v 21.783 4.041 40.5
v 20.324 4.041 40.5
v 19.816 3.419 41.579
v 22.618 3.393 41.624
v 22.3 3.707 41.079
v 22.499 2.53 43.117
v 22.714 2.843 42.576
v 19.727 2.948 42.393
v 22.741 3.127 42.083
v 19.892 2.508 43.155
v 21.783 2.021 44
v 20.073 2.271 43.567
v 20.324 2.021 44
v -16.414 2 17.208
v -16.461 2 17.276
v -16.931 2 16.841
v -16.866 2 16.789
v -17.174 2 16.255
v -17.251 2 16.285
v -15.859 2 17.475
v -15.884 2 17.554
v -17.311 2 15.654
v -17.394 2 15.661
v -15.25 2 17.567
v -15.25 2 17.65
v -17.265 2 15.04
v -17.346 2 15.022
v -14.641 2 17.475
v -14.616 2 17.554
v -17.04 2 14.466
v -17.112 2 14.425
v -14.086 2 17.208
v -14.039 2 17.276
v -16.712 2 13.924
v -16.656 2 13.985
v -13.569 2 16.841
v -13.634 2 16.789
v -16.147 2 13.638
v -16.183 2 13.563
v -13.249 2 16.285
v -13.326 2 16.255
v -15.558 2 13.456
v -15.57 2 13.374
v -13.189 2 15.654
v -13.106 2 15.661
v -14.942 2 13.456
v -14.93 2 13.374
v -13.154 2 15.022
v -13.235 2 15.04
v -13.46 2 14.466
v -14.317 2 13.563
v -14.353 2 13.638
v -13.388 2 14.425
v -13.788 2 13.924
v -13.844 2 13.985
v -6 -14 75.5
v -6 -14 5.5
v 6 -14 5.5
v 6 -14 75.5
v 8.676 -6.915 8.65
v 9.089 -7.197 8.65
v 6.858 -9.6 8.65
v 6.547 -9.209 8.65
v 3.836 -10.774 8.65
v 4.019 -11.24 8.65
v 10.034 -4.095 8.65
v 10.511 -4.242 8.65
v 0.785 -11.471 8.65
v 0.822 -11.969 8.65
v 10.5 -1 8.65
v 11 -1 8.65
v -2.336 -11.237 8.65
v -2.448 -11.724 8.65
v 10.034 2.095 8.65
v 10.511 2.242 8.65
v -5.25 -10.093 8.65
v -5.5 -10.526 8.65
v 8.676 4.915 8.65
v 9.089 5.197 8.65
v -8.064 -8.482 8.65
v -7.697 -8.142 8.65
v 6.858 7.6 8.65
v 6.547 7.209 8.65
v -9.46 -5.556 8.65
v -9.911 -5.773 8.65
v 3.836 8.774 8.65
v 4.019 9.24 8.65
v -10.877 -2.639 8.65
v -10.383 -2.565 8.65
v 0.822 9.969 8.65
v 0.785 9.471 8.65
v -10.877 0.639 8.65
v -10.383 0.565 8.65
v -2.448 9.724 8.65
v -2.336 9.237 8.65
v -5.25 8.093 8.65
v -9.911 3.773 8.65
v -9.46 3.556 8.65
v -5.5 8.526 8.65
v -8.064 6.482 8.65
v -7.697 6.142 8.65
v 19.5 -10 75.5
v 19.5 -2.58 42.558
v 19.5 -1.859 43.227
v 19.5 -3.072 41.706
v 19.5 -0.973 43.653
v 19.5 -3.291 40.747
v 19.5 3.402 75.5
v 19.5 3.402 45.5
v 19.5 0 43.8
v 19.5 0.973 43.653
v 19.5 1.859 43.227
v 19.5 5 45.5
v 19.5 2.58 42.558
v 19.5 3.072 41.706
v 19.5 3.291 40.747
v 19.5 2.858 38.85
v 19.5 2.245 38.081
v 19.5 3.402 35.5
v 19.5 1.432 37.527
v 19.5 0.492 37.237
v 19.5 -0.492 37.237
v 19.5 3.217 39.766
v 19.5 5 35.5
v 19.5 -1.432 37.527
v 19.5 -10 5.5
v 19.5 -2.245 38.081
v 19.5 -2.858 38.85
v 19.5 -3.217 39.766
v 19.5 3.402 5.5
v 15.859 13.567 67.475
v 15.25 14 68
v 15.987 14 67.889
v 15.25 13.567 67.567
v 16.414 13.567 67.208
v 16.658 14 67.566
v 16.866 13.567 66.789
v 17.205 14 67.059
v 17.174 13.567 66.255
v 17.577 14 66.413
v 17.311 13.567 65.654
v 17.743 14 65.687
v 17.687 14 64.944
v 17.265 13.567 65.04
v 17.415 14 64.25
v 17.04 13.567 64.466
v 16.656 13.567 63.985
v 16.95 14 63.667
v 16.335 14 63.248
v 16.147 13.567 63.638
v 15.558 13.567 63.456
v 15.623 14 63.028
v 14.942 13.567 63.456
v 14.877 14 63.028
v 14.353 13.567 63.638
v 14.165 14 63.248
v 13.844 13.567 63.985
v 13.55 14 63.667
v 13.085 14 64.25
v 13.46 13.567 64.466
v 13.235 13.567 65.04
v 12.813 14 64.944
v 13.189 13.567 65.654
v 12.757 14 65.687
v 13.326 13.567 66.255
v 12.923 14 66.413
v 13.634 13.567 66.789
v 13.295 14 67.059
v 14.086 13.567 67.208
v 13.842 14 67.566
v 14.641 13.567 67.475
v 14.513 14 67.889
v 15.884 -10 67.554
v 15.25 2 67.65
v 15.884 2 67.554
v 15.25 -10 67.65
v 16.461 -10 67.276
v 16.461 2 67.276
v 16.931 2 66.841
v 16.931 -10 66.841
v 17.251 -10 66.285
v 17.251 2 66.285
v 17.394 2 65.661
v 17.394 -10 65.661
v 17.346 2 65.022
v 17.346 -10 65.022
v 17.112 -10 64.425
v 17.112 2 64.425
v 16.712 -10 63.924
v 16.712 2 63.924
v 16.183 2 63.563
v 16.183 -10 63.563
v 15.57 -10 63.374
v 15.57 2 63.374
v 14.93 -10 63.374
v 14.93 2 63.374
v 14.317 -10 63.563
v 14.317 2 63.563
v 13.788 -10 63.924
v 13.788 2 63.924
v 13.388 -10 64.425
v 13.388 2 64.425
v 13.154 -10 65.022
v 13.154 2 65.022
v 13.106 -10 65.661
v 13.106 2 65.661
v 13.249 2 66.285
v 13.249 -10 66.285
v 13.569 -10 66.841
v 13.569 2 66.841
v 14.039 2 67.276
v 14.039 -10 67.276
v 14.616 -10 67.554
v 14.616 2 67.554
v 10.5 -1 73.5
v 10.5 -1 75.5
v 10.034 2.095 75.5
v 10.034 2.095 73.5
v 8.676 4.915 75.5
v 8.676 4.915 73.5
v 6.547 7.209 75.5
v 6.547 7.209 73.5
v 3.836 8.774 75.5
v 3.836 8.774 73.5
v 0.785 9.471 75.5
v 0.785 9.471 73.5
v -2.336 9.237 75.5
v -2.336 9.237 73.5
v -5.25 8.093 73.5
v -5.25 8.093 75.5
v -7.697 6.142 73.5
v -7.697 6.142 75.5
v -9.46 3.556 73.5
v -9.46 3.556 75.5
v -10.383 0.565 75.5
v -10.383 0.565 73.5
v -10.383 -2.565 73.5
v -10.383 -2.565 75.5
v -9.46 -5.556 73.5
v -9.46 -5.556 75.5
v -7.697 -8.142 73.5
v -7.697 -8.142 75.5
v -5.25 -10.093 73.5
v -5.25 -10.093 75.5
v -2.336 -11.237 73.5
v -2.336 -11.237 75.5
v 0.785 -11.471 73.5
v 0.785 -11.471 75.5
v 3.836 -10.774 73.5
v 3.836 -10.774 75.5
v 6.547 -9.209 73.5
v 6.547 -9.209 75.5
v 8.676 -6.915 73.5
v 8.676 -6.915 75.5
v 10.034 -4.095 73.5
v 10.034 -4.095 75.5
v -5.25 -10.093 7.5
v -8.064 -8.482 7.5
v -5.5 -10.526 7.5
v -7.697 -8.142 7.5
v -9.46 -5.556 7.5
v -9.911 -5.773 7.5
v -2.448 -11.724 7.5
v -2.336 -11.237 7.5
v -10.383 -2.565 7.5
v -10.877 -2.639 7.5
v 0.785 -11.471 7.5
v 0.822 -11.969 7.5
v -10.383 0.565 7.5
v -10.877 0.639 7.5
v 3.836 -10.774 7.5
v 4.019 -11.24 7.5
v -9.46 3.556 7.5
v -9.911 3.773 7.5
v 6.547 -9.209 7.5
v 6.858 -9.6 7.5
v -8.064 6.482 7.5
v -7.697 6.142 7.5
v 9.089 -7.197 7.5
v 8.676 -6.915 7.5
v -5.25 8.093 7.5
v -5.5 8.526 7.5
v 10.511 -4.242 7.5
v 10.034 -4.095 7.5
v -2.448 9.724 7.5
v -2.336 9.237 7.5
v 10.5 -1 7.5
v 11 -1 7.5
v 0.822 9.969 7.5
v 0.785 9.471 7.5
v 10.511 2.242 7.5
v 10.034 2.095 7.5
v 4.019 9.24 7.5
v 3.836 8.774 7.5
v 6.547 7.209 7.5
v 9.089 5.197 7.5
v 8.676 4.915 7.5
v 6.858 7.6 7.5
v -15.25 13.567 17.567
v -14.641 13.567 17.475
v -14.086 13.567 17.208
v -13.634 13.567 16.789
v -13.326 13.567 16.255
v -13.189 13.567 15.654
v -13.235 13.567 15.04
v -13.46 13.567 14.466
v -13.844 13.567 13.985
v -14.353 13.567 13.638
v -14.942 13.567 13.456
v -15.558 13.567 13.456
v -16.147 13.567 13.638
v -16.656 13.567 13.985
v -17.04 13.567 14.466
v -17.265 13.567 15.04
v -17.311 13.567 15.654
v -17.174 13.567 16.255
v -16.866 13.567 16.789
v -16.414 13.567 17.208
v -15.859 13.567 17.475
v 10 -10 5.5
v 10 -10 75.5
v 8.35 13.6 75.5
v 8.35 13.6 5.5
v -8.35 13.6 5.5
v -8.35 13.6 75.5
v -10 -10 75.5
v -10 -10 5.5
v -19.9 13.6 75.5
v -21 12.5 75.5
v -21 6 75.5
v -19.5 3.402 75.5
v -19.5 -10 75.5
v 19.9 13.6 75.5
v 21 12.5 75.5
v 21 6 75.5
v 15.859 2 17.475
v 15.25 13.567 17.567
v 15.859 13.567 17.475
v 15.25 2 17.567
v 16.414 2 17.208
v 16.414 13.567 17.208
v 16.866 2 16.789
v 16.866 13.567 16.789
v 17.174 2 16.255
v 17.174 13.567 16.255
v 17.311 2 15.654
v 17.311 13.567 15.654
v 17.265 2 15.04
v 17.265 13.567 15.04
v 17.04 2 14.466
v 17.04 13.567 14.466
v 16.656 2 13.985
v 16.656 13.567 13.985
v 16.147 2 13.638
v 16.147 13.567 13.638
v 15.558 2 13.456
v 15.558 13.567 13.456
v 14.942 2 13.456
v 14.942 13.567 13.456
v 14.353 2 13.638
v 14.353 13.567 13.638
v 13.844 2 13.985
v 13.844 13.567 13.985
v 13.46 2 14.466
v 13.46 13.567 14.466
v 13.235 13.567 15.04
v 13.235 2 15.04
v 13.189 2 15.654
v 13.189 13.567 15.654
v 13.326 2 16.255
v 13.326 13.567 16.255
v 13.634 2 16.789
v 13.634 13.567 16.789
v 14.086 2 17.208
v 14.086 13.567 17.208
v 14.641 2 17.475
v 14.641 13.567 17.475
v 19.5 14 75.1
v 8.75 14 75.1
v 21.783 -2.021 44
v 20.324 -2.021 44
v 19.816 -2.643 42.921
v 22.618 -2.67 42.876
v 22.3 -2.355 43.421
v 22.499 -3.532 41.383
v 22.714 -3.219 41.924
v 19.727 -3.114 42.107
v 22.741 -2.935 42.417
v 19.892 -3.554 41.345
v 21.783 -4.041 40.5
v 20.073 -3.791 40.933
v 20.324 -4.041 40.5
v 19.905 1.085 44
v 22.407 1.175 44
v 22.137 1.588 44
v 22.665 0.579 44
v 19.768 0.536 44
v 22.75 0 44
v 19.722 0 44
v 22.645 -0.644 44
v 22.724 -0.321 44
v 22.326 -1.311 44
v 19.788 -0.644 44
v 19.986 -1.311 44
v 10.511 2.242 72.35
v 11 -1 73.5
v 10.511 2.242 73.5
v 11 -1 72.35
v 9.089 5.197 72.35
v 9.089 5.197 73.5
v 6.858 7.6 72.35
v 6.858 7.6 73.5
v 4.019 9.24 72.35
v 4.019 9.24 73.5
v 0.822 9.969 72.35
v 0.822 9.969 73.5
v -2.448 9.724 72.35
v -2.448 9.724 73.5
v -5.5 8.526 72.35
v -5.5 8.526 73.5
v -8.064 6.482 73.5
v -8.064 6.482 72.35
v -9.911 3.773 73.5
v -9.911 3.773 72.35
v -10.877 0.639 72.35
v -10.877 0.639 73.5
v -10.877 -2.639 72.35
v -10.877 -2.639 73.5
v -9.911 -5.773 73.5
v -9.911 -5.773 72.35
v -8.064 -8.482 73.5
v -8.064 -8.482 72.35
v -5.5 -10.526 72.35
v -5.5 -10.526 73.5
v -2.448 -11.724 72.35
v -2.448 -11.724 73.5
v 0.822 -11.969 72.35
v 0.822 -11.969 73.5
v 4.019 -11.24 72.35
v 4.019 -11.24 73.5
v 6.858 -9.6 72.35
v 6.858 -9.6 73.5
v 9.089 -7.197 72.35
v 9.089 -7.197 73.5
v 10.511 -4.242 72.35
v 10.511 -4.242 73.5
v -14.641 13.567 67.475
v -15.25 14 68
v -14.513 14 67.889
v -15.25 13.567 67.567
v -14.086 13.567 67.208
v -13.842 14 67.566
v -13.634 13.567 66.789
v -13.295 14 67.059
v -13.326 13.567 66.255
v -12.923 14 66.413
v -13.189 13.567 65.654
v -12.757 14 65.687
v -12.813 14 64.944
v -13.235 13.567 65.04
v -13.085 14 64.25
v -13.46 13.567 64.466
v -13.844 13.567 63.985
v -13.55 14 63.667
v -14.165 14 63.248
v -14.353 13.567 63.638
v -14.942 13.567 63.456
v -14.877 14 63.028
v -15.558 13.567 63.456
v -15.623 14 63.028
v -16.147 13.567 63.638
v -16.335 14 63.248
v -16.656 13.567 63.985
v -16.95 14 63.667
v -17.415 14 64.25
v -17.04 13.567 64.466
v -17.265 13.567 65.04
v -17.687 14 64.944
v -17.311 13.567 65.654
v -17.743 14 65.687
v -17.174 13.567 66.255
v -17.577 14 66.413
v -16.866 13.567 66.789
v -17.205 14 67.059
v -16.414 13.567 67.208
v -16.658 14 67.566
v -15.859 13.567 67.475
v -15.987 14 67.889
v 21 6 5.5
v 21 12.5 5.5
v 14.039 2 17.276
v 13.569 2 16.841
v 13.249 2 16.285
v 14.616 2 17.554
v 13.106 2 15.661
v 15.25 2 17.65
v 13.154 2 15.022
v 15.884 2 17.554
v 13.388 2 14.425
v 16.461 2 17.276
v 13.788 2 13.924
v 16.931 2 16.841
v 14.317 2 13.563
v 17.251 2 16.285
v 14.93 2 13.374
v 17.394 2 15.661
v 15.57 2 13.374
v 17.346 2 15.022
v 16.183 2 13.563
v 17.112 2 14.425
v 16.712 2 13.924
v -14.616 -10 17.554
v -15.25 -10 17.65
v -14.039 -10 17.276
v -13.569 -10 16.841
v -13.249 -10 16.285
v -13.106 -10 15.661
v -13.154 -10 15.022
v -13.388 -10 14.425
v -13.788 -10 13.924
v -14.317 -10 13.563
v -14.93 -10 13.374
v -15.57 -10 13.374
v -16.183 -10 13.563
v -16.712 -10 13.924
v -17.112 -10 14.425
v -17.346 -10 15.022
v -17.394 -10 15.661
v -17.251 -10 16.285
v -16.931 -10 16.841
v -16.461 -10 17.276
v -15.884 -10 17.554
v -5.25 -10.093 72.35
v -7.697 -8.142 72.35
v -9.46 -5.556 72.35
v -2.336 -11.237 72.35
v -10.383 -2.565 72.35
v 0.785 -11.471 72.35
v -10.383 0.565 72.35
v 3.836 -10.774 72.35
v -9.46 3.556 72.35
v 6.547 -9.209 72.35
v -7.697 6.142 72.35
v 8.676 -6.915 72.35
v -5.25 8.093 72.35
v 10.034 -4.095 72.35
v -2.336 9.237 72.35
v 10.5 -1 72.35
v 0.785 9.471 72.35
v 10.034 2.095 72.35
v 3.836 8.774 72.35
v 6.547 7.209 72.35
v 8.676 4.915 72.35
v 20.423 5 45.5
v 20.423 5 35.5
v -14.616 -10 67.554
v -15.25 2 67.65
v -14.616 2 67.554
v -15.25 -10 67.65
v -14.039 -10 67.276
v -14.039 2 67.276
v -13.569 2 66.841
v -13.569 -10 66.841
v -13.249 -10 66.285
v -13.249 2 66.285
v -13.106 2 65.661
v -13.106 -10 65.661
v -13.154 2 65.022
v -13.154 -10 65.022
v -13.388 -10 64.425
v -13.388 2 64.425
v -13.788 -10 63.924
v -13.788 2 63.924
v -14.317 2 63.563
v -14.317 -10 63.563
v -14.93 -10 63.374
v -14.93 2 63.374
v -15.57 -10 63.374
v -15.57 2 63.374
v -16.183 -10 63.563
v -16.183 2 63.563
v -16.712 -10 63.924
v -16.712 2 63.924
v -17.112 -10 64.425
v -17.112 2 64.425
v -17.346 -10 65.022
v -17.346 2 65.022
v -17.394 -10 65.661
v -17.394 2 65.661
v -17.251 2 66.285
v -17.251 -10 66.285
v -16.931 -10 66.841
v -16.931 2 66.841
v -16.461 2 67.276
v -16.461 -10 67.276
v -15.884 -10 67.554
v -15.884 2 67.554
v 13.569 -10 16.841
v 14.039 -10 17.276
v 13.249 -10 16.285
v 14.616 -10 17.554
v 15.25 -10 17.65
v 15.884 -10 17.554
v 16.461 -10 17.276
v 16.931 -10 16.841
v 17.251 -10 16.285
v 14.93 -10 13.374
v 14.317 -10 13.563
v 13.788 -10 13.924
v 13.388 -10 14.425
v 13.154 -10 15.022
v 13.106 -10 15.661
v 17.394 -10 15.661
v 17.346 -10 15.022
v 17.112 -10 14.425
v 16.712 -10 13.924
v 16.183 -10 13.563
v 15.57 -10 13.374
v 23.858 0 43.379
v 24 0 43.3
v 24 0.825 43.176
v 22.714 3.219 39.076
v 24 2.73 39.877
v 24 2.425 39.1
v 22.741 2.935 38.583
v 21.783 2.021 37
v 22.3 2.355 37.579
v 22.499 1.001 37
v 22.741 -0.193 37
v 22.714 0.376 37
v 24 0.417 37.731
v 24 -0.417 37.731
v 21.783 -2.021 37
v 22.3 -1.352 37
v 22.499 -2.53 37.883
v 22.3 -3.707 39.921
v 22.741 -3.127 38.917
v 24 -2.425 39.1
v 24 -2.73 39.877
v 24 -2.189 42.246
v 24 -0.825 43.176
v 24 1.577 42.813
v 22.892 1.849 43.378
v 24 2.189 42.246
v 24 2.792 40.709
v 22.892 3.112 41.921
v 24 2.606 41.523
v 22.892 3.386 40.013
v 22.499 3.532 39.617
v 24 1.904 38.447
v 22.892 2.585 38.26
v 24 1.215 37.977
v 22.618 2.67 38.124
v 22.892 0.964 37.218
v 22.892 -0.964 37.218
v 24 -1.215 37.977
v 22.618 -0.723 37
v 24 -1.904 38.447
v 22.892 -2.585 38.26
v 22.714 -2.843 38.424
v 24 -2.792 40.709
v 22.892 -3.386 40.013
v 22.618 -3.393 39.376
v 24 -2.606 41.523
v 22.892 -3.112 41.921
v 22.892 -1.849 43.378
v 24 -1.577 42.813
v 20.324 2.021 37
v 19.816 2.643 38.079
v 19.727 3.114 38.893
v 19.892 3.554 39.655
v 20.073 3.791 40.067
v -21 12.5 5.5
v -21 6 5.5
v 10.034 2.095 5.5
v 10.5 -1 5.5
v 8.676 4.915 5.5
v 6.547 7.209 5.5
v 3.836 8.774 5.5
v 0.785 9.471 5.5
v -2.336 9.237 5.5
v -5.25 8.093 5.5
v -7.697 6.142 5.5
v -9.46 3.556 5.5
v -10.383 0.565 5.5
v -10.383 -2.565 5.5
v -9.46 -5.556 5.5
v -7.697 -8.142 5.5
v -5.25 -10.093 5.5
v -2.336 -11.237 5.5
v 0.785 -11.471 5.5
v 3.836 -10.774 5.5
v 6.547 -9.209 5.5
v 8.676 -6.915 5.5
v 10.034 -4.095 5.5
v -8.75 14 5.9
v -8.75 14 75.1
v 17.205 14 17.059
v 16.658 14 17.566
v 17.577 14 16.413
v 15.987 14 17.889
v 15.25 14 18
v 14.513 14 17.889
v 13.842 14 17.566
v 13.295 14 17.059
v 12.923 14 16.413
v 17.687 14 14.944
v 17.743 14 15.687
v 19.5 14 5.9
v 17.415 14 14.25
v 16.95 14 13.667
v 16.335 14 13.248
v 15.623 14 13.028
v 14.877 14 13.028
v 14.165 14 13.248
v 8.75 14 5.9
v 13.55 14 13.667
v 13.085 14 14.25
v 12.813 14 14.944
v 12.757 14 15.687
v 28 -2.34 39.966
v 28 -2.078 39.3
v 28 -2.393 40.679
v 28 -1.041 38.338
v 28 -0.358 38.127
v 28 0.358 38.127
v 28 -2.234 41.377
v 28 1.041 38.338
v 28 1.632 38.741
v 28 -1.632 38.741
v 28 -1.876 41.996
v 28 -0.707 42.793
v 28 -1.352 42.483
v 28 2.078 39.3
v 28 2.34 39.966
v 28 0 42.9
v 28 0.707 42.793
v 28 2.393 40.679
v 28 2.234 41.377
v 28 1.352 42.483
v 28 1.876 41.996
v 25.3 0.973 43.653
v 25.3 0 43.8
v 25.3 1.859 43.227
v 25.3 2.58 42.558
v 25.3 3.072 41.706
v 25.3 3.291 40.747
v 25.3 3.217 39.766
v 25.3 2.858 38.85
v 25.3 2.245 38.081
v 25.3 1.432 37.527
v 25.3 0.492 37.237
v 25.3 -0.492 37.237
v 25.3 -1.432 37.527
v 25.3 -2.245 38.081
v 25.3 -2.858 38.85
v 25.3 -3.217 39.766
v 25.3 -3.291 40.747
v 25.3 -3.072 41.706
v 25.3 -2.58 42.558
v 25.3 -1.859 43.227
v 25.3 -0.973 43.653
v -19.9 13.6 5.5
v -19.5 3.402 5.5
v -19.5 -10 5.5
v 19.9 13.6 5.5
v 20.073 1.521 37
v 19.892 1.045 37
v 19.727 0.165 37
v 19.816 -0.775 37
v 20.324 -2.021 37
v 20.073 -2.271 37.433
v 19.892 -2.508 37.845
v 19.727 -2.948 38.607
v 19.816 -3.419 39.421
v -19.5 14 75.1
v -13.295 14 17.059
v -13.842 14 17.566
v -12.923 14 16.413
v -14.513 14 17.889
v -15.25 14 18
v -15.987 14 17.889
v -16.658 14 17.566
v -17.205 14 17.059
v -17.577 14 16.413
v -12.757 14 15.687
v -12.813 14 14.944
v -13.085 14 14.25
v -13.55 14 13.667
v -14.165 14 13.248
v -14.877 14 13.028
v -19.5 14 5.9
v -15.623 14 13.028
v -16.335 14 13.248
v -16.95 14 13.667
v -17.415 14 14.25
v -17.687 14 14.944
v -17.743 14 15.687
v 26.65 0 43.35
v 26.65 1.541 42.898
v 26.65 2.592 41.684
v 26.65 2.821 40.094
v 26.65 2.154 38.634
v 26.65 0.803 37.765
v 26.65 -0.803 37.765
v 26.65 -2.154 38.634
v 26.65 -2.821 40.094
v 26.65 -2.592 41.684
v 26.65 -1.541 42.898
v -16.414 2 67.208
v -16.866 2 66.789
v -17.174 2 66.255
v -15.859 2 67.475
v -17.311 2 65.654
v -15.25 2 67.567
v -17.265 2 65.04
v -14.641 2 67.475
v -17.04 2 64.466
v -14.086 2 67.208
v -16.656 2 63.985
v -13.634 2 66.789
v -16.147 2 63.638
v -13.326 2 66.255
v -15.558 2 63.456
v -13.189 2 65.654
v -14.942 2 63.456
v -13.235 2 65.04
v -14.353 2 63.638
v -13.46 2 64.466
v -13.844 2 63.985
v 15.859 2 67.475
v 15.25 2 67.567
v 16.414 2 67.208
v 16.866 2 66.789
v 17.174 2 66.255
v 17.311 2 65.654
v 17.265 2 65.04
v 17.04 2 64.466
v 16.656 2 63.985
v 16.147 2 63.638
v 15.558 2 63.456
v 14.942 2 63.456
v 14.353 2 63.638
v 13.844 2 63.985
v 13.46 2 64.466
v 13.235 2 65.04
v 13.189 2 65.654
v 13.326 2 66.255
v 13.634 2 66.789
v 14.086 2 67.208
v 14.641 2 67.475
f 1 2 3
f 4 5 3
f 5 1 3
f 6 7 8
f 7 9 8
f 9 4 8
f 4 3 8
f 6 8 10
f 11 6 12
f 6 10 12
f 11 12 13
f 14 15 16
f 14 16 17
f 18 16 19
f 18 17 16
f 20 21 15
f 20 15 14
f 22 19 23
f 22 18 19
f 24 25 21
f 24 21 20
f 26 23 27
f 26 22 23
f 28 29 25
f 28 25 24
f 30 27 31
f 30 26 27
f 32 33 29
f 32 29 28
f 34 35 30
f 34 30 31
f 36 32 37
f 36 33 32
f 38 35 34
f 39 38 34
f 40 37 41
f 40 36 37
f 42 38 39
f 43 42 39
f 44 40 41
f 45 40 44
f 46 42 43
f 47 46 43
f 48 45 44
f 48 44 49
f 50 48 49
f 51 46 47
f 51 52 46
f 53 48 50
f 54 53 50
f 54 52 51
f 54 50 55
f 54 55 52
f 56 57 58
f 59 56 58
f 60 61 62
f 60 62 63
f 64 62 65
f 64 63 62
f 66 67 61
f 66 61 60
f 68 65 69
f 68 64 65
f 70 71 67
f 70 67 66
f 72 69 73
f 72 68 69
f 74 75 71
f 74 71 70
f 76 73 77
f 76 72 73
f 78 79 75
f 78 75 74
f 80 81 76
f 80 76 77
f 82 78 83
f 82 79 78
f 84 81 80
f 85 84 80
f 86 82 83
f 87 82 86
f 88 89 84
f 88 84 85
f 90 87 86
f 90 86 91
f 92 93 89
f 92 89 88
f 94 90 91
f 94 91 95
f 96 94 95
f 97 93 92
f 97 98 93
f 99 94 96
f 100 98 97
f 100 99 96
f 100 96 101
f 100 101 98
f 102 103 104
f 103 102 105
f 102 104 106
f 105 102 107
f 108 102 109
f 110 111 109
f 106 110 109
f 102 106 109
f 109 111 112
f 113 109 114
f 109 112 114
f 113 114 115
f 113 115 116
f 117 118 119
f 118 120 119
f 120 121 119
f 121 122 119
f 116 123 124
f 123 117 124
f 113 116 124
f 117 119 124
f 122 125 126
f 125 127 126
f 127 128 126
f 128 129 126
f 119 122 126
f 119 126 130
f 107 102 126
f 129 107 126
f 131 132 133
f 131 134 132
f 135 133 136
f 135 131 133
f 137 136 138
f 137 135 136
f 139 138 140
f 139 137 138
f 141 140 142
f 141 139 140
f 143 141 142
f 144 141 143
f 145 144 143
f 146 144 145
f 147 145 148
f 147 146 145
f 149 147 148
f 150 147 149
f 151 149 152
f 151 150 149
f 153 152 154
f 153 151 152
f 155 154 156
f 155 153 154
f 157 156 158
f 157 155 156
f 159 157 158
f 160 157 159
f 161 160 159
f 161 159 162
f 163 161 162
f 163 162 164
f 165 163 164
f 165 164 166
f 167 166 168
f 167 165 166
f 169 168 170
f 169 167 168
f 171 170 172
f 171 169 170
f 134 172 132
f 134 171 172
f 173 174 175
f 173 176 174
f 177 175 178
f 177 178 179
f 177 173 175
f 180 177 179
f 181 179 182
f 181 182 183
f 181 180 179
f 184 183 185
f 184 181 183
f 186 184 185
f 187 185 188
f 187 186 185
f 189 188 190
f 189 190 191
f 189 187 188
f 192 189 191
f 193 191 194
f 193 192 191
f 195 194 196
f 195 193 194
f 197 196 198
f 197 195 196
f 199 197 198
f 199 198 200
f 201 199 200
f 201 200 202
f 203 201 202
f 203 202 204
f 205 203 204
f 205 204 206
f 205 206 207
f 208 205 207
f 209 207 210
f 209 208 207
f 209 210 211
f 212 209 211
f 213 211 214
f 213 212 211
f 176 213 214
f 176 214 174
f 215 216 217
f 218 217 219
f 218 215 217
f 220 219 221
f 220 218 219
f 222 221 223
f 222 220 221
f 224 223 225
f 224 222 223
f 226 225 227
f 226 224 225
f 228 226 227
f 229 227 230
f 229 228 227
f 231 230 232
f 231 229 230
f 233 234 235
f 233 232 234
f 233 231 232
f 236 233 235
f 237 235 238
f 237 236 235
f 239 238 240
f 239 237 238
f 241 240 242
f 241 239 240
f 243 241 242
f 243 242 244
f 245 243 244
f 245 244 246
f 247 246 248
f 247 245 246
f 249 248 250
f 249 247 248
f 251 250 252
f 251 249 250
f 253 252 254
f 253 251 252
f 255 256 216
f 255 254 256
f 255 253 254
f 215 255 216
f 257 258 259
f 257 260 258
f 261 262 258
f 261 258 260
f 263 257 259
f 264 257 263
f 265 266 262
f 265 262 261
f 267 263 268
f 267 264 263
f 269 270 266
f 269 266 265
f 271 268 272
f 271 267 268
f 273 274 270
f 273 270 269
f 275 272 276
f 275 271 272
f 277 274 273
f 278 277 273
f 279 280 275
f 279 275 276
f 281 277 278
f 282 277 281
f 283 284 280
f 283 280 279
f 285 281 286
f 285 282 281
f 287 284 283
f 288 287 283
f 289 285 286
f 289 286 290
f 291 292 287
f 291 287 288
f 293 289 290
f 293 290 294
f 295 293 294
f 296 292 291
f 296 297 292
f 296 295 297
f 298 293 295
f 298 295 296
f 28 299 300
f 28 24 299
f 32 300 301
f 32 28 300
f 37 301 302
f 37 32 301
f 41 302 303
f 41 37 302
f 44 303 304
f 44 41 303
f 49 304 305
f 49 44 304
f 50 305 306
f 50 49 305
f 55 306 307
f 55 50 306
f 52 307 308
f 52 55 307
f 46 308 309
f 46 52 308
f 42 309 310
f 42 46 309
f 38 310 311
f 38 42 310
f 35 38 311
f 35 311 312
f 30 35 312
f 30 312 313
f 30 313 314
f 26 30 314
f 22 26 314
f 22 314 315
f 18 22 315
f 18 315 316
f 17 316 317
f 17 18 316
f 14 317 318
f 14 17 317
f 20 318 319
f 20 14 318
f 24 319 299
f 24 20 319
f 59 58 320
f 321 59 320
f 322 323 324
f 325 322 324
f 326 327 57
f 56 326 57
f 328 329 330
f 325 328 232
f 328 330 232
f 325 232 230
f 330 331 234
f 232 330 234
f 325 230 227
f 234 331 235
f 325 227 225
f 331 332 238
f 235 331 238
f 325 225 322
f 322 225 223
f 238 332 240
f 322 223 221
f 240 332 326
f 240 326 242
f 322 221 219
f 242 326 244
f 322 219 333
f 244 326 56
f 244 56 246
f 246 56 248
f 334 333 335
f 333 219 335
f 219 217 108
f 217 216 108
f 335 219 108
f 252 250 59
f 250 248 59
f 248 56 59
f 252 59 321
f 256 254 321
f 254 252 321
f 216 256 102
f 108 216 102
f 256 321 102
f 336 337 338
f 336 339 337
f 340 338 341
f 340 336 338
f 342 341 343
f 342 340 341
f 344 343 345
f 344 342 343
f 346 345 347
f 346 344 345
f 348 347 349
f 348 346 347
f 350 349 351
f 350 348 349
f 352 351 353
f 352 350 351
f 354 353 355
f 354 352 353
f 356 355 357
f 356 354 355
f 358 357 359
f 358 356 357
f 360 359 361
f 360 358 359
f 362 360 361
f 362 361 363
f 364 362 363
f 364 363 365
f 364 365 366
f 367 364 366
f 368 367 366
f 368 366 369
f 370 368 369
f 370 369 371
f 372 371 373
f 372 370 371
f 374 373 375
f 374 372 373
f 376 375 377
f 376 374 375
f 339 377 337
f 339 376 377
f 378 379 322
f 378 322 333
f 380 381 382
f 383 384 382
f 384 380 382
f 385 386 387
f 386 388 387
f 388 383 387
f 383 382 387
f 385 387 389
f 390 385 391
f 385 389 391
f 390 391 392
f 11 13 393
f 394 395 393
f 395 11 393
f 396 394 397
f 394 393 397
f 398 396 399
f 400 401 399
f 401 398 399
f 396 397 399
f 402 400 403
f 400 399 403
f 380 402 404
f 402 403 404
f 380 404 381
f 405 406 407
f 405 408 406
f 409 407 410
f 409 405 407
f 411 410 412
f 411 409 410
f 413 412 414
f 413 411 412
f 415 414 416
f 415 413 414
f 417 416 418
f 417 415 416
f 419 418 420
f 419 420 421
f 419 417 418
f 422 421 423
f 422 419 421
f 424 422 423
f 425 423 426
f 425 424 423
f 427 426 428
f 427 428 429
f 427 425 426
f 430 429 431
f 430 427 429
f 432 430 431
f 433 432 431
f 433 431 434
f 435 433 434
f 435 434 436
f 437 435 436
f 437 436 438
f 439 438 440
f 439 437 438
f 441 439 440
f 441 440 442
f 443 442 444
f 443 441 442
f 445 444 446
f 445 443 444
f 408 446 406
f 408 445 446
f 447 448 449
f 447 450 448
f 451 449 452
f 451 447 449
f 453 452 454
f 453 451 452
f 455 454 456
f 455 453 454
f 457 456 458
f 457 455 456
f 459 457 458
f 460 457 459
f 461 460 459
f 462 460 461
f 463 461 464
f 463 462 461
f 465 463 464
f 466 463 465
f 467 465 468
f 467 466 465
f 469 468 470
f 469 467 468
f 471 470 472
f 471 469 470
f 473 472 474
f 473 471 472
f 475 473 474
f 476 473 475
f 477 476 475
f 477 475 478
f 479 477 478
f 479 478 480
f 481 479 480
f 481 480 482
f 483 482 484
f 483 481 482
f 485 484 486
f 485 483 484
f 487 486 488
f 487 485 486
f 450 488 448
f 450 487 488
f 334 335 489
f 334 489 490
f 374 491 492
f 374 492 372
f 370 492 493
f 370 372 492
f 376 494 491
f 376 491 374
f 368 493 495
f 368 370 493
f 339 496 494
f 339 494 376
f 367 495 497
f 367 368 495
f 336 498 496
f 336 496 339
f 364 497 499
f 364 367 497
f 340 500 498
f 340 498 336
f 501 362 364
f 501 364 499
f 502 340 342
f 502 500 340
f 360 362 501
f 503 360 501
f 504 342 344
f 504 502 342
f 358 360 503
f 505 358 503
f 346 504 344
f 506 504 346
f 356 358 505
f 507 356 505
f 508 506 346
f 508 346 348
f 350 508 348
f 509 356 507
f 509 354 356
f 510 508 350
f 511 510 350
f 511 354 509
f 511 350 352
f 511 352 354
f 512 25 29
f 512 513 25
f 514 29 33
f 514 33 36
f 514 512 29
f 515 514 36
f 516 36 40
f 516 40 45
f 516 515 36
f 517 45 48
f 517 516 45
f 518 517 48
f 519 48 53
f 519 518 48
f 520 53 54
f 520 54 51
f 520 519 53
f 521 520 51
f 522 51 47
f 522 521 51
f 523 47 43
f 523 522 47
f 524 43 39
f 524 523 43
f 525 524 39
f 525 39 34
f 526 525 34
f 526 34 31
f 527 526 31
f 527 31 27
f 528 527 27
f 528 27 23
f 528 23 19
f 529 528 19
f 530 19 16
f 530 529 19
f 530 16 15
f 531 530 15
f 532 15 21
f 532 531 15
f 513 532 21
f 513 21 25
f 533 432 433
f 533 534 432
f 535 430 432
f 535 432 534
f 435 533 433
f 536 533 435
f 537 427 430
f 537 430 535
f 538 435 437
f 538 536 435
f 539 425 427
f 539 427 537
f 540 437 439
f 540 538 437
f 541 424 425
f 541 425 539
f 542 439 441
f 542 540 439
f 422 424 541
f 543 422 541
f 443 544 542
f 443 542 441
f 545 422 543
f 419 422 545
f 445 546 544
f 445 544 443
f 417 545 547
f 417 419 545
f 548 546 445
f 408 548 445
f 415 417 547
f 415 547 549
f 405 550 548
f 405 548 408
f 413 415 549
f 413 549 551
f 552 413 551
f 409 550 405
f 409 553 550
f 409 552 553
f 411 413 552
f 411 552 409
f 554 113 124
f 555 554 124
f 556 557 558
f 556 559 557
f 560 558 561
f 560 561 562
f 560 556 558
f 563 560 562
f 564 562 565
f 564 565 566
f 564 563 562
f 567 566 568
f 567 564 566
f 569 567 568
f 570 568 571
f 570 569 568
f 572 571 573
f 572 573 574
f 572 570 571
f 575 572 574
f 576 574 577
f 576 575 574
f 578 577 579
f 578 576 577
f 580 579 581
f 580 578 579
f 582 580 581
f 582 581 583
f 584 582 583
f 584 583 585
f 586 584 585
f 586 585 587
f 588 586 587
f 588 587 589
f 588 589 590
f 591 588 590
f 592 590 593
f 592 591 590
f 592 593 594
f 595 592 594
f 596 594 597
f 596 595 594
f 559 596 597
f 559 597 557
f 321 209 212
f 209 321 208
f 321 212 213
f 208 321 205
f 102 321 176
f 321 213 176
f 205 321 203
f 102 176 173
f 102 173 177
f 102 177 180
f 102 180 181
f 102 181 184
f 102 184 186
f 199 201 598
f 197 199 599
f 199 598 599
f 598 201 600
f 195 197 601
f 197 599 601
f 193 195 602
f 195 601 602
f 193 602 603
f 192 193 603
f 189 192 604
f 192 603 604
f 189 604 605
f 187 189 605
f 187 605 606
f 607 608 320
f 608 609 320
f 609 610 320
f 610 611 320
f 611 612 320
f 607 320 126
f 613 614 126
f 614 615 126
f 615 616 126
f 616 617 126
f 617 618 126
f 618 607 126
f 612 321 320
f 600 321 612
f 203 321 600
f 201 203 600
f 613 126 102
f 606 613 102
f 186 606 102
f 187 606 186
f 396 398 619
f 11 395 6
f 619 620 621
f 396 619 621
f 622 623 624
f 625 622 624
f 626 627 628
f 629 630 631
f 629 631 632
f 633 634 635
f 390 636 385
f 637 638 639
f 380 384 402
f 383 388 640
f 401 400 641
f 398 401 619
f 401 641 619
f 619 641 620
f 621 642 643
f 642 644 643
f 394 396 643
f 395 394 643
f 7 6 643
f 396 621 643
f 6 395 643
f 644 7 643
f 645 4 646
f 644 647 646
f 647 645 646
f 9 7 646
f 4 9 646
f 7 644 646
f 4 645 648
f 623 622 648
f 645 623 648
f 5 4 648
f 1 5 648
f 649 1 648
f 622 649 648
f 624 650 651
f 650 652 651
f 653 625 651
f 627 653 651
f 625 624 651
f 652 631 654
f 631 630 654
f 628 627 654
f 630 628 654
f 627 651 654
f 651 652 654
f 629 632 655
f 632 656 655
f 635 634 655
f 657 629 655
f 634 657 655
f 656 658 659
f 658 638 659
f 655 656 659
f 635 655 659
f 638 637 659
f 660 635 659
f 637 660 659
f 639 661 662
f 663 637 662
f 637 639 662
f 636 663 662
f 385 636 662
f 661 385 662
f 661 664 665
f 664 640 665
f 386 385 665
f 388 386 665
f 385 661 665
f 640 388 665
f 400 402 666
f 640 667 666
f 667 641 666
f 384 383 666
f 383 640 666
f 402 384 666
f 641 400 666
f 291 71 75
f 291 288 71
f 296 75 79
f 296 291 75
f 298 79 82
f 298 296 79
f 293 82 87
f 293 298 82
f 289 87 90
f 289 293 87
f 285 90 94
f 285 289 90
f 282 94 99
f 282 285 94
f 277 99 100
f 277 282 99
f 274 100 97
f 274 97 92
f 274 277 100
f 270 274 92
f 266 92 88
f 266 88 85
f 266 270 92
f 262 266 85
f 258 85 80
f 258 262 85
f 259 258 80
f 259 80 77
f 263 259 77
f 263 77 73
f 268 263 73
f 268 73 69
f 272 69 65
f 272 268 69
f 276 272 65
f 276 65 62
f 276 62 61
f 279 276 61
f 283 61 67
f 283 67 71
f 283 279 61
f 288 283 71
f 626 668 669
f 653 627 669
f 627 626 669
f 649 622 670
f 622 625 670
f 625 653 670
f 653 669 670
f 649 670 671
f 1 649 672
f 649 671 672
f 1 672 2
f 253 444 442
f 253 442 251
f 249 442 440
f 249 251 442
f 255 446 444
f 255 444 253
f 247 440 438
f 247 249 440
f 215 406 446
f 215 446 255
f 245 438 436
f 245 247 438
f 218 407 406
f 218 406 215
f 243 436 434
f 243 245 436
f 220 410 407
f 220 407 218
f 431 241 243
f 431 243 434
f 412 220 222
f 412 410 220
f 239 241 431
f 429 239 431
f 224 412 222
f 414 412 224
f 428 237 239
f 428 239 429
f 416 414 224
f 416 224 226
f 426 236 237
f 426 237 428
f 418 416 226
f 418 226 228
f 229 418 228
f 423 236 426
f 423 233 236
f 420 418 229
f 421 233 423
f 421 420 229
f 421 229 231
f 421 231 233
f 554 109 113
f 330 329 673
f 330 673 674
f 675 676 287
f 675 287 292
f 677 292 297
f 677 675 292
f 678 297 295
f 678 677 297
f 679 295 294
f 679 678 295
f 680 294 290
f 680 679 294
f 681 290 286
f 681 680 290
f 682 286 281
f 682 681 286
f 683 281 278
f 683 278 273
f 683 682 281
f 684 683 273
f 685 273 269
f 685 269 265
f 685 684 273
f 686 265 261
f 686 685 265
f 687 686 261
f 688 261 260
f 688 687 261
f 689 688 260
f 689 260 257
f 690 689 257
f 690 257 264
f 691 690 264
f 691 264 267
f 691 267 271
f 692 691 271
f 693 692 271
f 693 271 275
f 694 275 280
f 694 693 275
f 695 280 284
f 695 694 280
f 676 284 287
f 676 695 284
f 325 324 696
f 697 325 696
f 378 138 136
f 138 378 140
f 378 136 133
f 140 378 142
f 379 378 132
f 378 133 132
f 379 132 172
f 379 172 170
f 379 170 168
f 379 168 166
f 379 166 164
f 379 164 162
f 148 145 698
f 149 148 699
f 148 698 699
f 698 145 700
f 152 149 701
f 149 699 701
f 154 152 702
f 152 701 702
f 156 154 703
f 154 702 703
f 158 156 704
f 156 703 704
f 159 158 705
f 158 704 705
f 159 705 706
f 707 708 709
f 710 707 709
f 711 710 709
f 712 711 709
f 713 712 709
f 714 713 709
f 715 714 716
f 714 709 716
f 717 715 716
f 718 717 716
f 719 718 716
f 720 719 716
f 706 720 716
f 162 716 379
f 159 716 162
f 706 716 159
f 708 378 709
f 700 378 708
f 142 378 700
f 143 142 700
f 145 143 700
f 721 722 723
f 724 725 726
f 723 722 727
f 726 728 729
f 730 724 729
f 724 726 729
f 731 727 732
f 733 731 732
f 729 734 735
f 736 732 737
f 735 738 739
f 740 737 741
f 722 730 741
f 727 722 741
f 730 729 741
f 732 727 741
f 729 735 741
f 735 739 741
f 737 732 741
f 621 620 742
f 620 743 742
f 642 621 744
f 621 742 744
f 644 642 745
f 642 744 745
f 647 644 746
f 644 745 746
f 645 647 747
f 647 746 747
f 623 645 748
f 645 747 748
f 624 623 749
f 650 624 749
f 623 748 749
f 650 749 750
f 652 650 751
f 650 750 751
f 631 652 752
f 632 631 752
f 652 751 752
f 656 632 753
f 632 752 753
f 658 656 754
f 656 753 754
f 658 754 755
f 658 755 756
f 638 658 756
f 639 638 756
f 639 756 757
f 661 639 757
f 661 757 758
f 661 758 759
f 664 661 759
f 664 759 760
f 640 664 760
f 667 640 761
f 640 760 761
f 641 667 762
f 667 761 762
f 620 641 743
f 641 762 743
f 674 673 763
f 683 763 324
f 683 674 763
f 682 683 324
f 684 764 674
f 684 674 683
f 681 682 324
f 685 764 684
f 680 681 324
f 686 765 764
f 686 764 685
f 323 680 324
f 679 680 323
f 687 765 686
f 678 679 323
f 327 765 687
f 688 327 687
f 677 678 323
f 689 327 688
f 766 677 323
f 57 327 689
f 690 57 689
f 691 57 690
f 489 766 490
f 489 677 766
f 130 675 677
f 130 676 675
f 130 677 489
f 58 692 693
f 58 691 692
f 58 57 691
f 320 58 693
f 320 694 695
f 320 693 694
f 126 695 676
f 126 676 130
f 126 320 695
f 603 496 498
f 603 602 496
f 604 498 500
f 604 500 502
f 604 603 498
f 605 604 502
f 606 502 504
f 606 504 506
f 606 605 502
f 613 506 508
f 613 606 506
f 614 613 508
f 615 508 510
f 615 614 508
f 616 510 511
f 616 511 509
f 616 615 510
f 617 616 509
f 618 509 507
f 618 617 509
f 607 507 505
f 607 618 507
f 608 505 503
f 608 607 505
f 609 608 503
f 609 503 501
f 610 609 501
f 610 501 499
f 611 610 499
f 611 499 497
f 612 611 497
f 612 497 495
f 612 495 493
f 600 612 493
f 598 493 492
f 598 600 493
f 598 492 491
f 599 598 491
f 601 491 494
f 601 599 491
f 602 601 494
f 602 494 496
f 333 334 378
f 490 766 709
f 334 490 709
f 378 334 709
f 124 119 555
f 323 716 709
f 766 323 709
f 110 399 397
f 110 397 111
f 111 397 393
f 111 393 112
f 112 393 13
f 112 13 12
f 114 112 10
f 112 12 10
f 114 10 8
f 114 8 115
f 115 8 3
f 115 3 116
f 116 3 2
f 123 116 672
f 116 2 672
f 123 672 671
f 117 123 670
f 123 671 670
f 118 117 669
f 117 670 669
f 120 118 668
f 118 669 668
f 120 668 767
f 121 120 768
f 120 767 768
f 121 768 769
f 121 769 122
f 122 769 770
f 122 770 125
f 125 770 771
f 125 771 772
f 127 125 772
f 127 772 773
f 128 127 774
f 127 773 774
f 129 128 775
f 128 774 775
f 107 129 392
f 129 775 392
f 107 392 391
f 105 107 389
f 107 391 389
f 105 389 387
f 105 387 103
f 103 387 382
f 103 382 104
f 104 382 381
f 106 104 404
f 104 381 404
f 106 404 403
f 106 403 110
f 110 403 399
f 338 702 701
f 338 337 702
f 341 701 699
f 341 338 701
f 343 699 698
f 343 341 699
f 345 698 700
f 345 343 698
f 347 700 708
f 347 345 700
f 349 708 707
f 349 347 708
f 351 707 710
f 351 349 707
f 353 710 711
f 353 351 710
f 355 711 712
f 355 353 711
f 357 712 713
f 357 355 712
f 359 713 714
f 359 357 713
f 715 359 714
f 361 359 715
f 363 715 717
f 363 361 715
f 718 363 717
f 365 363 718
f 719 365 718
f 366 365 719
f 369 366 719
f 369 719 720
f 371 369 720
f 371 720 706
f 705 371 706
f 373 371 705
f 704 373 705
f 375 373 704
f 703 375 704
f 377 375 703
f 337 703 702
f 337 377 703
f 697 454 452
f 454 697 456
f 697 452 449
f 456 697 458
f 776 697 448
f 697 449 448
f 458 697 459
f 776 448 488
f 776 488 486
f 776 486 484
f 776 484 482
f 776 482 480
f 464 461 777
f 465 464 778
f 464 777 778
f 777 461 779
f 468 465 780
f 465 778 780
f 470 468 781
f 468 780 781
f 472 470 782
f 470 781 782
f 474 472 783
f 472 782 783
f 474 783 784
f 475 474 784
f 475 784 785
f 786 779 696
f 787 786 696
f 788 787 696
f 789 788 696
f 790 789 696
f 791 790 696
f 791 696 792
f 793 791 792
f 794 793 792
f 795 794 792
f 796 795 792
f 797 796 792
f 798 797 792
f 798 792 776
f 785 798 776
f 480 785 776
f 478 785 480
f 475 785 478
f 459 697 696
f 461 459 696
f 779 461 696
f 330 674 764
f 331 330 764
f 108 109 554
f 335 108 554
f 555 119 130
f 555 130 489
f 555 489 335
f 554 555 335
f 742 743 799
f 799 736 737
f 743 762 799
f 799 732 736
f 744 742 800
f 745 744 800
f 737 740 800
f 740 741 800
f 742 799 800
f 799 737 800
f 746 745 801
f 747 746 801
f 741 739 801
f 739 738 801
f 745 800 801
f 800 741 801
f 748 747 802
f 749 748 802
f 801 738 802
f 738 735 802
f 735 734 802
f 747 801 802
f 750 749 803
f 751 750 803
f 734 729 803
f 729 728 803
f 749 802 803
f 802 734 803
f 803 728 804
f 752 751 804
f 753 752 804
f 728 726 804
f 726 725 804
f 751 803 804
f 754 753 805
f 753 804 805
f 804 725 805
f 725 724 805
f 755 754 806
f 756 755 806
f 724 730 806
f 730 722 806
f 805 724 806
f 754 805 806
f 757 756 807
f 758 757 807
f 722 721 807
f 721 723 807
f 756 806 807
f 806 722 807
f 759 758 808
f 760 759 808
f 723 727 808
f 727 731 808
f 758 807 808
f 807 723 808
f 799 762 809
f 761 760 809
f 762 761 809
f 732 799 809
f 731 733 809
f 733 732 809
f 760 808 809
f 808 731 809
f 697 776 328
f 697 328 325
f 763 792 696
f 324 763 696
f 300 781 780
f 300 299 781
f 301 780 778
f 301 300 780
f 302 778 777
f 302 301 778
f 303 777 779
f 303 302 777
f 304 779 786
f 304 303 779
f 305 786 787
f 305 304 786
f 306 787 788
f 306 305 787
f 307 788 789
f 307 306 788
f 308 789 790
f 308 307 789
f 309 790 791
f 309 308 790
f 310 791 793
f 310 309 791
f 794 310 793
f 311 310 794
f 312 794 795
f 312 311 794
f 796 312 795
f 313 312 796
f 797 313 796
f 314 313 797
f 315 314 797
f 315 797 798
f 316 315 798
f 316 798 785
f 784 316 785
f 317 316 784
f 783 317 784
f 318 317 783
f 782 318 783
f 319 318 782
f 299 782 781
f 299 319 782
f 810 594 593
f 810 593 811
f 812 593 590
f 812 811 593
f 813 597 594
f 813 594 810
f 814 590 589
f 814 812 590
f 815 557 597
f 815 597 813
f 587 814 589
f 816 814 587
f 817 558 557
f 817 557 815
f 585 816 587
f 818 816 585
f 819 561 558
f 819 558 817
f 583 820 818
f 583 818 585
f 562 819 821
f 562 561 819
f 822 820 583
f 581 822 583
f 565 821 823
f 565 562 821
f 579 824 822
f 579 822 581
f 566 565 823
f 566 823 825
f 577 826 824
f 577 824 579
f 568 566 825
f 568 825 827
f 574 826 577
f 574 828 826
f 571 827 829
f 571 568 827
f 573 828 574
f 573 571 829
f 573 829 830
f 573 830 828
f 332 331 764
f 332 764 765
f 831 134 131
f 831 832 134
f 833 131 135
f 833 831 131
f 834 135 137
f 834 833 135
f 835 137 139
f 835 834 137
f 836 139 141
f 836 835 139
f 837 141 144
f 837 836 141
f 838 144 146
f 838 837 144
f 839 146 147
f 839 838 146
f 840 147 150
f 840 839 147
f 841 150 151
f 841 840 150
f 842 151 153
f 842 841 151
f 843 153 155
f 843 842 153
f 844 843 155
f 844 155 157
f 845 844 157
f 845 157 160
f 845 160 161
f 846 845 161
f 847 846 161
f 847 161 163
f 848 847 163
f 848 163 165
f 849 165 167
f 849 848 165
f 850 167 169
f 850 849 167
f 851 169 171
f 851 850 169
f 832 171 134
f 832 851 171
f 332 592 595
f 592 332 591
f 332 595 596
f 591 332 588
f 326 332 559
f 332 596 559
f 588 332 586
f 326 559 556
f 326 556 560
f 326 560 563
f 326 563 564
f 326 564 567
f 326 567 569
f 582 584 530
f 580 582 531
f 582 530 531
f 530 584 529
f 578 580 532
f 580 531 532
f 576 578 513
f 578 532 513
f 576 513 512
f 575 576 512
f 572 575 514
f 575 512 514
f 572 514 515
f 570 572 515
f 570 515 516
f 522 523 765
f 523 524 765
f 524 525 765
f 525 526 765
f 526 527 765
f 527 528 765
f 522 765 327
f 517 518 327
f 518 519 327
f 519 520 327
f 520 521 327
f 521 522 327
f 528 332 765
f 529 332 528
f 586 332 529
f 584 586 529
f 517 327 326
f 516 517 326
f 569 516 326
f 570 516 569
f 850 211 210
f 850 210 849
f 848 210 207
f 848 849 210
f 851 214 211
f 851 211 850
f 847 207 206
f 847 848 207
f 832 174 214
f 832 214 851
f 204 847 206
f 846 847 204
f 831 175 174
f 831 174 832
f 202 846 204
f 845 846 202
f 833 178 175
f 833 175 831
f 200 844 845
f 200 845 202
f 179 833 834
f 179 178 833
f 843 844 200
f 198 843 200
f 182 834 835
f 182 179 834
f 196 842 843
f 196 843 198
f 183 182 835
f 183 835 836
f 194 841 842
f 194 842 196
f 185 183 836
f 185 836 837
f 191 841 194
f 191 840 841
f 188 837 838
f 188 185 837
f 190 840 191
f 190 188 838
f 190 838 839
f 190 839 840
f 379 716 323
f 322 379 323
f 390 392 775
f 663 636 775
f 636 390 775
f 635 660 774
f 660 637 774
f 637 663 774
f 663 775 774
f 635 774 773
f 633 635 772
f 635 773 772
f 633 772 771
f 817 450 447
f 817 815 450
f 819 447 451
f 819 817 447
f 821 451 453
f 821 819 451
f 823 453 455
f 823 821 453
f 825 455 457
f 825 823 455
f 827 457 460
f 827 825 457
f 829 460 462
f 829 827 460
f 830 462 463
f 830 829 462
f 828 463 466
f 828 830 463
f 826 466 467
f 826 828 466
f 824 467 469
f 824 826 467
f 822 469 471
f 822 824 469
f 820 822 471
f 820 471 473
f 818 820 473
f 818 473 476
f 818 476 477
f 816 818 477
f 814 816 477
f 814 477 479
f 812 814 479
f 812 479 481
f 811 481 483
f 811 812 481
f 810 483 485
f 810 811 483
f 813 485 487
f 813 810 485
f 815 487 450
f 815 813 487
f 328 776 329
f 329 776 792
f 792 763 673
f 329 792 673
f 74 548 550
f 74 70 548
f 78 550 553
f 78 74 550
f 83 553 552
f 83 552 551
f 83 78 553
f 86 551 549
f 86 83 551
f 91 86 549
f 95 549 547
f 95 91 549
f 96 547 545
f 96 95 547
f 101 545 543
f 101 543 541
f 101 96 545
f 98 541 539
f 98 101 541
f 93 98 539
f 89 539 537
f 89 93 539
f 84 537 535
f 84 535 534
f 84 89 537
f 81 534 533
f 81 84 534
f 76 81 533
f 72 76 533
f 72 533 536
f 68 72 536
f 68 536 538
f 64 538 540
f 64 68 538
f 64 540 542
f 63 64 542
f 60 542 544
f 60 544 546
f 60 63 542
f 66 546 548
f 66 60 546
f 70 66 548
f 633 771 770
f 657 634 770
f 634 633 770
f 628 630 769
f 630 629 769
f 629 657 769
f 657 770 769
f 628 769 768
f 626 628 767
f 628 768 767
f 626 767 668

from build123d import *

# Parameters (mm, degrees)
BOSS_EXTRUDE1_DEPTH     = 81
CUT_EXTRUDE1_DEPTH      = 42
CUT_EXTRUDE1_DEPTH_BACK = 42
SKETCH2_W               = 2931
SKETCH2_H               = 2169
SKETCH9_W               = 10
SKETCH9_H               = 10
CUT_EXTRUDE2_DEPTH      = 10
CUT_EXTRUDE3_START      = -28
SKETCH11_W              = 238.622036278
SKETCH11_H              = 213.304880218
SKETCH11_W_2            = 101.706666714
SKETCH11_H_2            = 70
CUT_EXTRUDE3_DEPTH      = 28
CHAMFER1_SIZE           = 0.4


with BuildPart() as part:
    # Sketch1 → Boss-Extrude1 (new body)
    with BuildSketch(Plane.XY):
        Polygon((-21, 12.5), (-21, 6), (-19.5, 3.401923789), (-19.5, -10), (-10, -10), (-6, -14), (6, -14), (10, -10), (19.5, -10), (19.5, 3.401923789), (21, 6), (21, 12.5), (19.5, 14), (8.75, 14), (8.35, 13.6), (-8.35, 13.6), (-8.75, 14), (-19.5, 14), align=None)
    extrude(amount=BOSS_EXTRUDE1_DEPTH)

    # Sketch2 → Cut-Extrude1 (cut, two sides: drawn at the far end of the back side and taken through both)
    with BuildSketch(Plane(origin=(0, 0, 0), x_dir=(0, 0, -1), z_dir=(1, 0, 0)).offset(-CUT_EXTRUDE1_DEPTH_BACK)):
        with Locations((-31.5, -9.5)):
            Rectangle(SKETCH2_W, SKETCH2_H)
        Polygon((-81, -14), (0, -14), (0, 13.6), (-0.4, 14), (-80.6, 14), (-81, 13.6), align=None, mode=Mode.SUBTRACT)
    extrude(amount=CUT_EXTRUDE1_DEPTH + CUT_EXTRUDE1_DEPTH_BACK, mode=Mode.SUBTRACT)

    # Sketch3 → Cut-Revolve1 (revolve, cut)
    with BuildSketch(Plane.XY.offset(15.5), mode=Mode.PRIVATE) as cut_revolve1_sk:
        Polygon((-15.25, 14), (-12.75, 14), (-13.183, 13.567), (-13.183, 2), (-13.1, 2), (-13.1, -10), (-15.25, -10), align=None)
    revolve(cut_revolve1_sk.sketch.rotate(Axis((-15.25, -10, 15.5), (0, 1, 0)), 270), axis=Axis((-15.25, -10, 15.5), (0, 1, 0)), mode=Mode.SUBTRACT)

    # Sketch4 → Cut-Revolve2 (revolve, cut)
    with BuildSketch(Plane.XY.offset(15.5), mode=Mode.PRIVATE) as cut_revolve2_sk:
        Polygon((15.25, 14), (17.75, 14), (17.317, 13.567), (17.317, 2), (17.4, 2), (17.4, -10), (15.25, -10), align=None)
    revolve(cut_revolve2_sk.sketch.rotate(Axis((15.25, -10, 15.5), (0, 1, 0)), 270), axis=Axis((15.25, -10, 15.5), (0, 1, 0)), mode=Mode.SUBTRACT)

    # Sketch5 → Cut-Revolve3 (revolve, cut)
    with BuildSketch(Plane.XY.offset(65.5), mode=Mode.PRIVATE) as cut_revolve3_sk:
        Polygon((-15.25, 14), (-12.75, 14), (-13.183, 13.567), (-13.183, 2), (-13.1, 2), (-13.1, -10), (-15.25, -10), align=None)
    revolve(cut_revolve3_sk.sketch.rotate(Axis((-15.25, -10, 65.5), (0, 1, 0)), 270), axis=Axis((-15.25, -10, 65.5), (0, 1, 0)), mode=Mode.SUBTRACT)

    # Sketch6 → Cut-Revolve4 (revolve, cut)
    with BuildSketch(Plane.XY.offset(65.5), mode=Mode.PRIVATE) as cut_revolve4_sk:
        Polygon((15.25, 14), (17.75, 14), (17.317, 13.567), (17.317, 2), (17.4, 2), (17.4, -10), (15.25, -10), align=None)
    revolve(cut_revolve4_sk.sketch.rotate(Axis((15.25, -10, 65.5), (0, 1, 0)), 270), axis=Axis((15.25, -10, 65.5), (0, 1, 0)), mode=Mode.SUBTRACT)

    # Sketch7 → Cut-Revolve5 (revolve, cut)
    with BuildSketch(Plane(origin=(0, 0, 0), x_dir=(0, 0, -1), z_dir=(1, 0, 0)), mode=Mode.PRIVATE) as cut_revolve5_sk:
        Polygon((-81, -1), (-81, 9.5), (-73.5, 9.5), (-73.5, 10), (-72.35, 10), (-72.35, 9.5), (-8.65, 9.5), (-8.65, 10), (-7.5, 10), (-7.5, 9.5), (0, 9.5), (0, -1), align=None)
    revolve(cut_revolve5_sk.sketch.rotate(Axis((0, -1, 0), (0, 0, 1)), 270), axis=Axis((0, -1, 0), (0, 0, 1)), mode=Mode.SUBTRACT)

    # Sketch8 → Revolve1 (revolve)
    with BuildSketch(Plane.XY.offset(40.5), mode=Mode.PRIVATE) as revolve1_sk:
        Polygon((19.5, 0), (19.5, 3.3), (20.5, 4.2), (21.5, 4.2), (24, 2.8), (25.3, 3.3), (28, 2.4), (28, 0), align=None)
    revolve(revolve1_sk.sketch.rotate(Axis((28, 0, 40.5), (-1, 0, 0)), 270), axis=Axis((28, 0, 40.5), (-1, 0, 0)))

    # Sketch9 → Cut-Extrude2 (cut)
    with BuildSketch(Plane(origin=(19.5, 0, 0), x_dir=(0, 0, -1), z_dir=(1, 0, 0))):
        with Locations((-40.5, 0)):
            Rectangle(SKETCH9_W, SKETCH9_H)
        Polygon((-44, 2.020725942), (-44, -2.020725942), (-40.5, -4.041451884), (-37, -2.020725942), (-37, 2.020725942), (-40.5, 4.041451884), align=None, mode=Mode.SUBTRACT)
    extrude(amount=CUT_EXTRUDE2_DEPTH, mode=Mode.SUBTRACT)

    # Sketch10 → Cut-Revolve6 (revolve, cut)
    with BuildSketch(Plane.XY.offset(40.5), mode=Mode.PRIVATE) as cut_revolve6_sk:
        Polygon((19.5, 4.2), (19.5, 3.3), (20.5, 4.2), align=None)
    revolve(cut_revolve6_sk.sketch.rotate(Axis((28, 0, 40.5), (-1, 0, 0)), 59.999999594), axis=Axis((28, 0, 40.5), (-1, 0, 0)), mode=Mode.SUBTRACT)

    # Sketch11 → Cut-Extrude3 (cut)
    with BuildSketch(Plane(origin=(0, 14, 0), x_dir=(1, 0, 0), z_dir=(0, 1, 0)).offset(CUT_EXTRUDE3_START)):
        with Locations((12.049646303, -40.5)):
            Rectangle(SKETCH11_W, SKETCH11_H)
        with Locations((12.049646303, -40.5)):
            Rectangle(SKETCH11_W_2, SKETCH11_H_2, mode=Mode.SUBTRACT)
    extrude(amount=CUT_EXTRUDE3_DEPTH, mode=Mode.SUBTRACT)

    # Chamfer1
    chamfer1_edges = [part.edges().sort_by_distance(p)[0] for p in [
        (-14.125, 14, 5.5),
        (14.125, 14, 5.5),
        (14.125, 14, 75.5),
        (-14.125, 14, 75.5),
    ]]
    chamfer(chamfer1_edges, length=CHAMFER1_SIZE)


solid = part.part
